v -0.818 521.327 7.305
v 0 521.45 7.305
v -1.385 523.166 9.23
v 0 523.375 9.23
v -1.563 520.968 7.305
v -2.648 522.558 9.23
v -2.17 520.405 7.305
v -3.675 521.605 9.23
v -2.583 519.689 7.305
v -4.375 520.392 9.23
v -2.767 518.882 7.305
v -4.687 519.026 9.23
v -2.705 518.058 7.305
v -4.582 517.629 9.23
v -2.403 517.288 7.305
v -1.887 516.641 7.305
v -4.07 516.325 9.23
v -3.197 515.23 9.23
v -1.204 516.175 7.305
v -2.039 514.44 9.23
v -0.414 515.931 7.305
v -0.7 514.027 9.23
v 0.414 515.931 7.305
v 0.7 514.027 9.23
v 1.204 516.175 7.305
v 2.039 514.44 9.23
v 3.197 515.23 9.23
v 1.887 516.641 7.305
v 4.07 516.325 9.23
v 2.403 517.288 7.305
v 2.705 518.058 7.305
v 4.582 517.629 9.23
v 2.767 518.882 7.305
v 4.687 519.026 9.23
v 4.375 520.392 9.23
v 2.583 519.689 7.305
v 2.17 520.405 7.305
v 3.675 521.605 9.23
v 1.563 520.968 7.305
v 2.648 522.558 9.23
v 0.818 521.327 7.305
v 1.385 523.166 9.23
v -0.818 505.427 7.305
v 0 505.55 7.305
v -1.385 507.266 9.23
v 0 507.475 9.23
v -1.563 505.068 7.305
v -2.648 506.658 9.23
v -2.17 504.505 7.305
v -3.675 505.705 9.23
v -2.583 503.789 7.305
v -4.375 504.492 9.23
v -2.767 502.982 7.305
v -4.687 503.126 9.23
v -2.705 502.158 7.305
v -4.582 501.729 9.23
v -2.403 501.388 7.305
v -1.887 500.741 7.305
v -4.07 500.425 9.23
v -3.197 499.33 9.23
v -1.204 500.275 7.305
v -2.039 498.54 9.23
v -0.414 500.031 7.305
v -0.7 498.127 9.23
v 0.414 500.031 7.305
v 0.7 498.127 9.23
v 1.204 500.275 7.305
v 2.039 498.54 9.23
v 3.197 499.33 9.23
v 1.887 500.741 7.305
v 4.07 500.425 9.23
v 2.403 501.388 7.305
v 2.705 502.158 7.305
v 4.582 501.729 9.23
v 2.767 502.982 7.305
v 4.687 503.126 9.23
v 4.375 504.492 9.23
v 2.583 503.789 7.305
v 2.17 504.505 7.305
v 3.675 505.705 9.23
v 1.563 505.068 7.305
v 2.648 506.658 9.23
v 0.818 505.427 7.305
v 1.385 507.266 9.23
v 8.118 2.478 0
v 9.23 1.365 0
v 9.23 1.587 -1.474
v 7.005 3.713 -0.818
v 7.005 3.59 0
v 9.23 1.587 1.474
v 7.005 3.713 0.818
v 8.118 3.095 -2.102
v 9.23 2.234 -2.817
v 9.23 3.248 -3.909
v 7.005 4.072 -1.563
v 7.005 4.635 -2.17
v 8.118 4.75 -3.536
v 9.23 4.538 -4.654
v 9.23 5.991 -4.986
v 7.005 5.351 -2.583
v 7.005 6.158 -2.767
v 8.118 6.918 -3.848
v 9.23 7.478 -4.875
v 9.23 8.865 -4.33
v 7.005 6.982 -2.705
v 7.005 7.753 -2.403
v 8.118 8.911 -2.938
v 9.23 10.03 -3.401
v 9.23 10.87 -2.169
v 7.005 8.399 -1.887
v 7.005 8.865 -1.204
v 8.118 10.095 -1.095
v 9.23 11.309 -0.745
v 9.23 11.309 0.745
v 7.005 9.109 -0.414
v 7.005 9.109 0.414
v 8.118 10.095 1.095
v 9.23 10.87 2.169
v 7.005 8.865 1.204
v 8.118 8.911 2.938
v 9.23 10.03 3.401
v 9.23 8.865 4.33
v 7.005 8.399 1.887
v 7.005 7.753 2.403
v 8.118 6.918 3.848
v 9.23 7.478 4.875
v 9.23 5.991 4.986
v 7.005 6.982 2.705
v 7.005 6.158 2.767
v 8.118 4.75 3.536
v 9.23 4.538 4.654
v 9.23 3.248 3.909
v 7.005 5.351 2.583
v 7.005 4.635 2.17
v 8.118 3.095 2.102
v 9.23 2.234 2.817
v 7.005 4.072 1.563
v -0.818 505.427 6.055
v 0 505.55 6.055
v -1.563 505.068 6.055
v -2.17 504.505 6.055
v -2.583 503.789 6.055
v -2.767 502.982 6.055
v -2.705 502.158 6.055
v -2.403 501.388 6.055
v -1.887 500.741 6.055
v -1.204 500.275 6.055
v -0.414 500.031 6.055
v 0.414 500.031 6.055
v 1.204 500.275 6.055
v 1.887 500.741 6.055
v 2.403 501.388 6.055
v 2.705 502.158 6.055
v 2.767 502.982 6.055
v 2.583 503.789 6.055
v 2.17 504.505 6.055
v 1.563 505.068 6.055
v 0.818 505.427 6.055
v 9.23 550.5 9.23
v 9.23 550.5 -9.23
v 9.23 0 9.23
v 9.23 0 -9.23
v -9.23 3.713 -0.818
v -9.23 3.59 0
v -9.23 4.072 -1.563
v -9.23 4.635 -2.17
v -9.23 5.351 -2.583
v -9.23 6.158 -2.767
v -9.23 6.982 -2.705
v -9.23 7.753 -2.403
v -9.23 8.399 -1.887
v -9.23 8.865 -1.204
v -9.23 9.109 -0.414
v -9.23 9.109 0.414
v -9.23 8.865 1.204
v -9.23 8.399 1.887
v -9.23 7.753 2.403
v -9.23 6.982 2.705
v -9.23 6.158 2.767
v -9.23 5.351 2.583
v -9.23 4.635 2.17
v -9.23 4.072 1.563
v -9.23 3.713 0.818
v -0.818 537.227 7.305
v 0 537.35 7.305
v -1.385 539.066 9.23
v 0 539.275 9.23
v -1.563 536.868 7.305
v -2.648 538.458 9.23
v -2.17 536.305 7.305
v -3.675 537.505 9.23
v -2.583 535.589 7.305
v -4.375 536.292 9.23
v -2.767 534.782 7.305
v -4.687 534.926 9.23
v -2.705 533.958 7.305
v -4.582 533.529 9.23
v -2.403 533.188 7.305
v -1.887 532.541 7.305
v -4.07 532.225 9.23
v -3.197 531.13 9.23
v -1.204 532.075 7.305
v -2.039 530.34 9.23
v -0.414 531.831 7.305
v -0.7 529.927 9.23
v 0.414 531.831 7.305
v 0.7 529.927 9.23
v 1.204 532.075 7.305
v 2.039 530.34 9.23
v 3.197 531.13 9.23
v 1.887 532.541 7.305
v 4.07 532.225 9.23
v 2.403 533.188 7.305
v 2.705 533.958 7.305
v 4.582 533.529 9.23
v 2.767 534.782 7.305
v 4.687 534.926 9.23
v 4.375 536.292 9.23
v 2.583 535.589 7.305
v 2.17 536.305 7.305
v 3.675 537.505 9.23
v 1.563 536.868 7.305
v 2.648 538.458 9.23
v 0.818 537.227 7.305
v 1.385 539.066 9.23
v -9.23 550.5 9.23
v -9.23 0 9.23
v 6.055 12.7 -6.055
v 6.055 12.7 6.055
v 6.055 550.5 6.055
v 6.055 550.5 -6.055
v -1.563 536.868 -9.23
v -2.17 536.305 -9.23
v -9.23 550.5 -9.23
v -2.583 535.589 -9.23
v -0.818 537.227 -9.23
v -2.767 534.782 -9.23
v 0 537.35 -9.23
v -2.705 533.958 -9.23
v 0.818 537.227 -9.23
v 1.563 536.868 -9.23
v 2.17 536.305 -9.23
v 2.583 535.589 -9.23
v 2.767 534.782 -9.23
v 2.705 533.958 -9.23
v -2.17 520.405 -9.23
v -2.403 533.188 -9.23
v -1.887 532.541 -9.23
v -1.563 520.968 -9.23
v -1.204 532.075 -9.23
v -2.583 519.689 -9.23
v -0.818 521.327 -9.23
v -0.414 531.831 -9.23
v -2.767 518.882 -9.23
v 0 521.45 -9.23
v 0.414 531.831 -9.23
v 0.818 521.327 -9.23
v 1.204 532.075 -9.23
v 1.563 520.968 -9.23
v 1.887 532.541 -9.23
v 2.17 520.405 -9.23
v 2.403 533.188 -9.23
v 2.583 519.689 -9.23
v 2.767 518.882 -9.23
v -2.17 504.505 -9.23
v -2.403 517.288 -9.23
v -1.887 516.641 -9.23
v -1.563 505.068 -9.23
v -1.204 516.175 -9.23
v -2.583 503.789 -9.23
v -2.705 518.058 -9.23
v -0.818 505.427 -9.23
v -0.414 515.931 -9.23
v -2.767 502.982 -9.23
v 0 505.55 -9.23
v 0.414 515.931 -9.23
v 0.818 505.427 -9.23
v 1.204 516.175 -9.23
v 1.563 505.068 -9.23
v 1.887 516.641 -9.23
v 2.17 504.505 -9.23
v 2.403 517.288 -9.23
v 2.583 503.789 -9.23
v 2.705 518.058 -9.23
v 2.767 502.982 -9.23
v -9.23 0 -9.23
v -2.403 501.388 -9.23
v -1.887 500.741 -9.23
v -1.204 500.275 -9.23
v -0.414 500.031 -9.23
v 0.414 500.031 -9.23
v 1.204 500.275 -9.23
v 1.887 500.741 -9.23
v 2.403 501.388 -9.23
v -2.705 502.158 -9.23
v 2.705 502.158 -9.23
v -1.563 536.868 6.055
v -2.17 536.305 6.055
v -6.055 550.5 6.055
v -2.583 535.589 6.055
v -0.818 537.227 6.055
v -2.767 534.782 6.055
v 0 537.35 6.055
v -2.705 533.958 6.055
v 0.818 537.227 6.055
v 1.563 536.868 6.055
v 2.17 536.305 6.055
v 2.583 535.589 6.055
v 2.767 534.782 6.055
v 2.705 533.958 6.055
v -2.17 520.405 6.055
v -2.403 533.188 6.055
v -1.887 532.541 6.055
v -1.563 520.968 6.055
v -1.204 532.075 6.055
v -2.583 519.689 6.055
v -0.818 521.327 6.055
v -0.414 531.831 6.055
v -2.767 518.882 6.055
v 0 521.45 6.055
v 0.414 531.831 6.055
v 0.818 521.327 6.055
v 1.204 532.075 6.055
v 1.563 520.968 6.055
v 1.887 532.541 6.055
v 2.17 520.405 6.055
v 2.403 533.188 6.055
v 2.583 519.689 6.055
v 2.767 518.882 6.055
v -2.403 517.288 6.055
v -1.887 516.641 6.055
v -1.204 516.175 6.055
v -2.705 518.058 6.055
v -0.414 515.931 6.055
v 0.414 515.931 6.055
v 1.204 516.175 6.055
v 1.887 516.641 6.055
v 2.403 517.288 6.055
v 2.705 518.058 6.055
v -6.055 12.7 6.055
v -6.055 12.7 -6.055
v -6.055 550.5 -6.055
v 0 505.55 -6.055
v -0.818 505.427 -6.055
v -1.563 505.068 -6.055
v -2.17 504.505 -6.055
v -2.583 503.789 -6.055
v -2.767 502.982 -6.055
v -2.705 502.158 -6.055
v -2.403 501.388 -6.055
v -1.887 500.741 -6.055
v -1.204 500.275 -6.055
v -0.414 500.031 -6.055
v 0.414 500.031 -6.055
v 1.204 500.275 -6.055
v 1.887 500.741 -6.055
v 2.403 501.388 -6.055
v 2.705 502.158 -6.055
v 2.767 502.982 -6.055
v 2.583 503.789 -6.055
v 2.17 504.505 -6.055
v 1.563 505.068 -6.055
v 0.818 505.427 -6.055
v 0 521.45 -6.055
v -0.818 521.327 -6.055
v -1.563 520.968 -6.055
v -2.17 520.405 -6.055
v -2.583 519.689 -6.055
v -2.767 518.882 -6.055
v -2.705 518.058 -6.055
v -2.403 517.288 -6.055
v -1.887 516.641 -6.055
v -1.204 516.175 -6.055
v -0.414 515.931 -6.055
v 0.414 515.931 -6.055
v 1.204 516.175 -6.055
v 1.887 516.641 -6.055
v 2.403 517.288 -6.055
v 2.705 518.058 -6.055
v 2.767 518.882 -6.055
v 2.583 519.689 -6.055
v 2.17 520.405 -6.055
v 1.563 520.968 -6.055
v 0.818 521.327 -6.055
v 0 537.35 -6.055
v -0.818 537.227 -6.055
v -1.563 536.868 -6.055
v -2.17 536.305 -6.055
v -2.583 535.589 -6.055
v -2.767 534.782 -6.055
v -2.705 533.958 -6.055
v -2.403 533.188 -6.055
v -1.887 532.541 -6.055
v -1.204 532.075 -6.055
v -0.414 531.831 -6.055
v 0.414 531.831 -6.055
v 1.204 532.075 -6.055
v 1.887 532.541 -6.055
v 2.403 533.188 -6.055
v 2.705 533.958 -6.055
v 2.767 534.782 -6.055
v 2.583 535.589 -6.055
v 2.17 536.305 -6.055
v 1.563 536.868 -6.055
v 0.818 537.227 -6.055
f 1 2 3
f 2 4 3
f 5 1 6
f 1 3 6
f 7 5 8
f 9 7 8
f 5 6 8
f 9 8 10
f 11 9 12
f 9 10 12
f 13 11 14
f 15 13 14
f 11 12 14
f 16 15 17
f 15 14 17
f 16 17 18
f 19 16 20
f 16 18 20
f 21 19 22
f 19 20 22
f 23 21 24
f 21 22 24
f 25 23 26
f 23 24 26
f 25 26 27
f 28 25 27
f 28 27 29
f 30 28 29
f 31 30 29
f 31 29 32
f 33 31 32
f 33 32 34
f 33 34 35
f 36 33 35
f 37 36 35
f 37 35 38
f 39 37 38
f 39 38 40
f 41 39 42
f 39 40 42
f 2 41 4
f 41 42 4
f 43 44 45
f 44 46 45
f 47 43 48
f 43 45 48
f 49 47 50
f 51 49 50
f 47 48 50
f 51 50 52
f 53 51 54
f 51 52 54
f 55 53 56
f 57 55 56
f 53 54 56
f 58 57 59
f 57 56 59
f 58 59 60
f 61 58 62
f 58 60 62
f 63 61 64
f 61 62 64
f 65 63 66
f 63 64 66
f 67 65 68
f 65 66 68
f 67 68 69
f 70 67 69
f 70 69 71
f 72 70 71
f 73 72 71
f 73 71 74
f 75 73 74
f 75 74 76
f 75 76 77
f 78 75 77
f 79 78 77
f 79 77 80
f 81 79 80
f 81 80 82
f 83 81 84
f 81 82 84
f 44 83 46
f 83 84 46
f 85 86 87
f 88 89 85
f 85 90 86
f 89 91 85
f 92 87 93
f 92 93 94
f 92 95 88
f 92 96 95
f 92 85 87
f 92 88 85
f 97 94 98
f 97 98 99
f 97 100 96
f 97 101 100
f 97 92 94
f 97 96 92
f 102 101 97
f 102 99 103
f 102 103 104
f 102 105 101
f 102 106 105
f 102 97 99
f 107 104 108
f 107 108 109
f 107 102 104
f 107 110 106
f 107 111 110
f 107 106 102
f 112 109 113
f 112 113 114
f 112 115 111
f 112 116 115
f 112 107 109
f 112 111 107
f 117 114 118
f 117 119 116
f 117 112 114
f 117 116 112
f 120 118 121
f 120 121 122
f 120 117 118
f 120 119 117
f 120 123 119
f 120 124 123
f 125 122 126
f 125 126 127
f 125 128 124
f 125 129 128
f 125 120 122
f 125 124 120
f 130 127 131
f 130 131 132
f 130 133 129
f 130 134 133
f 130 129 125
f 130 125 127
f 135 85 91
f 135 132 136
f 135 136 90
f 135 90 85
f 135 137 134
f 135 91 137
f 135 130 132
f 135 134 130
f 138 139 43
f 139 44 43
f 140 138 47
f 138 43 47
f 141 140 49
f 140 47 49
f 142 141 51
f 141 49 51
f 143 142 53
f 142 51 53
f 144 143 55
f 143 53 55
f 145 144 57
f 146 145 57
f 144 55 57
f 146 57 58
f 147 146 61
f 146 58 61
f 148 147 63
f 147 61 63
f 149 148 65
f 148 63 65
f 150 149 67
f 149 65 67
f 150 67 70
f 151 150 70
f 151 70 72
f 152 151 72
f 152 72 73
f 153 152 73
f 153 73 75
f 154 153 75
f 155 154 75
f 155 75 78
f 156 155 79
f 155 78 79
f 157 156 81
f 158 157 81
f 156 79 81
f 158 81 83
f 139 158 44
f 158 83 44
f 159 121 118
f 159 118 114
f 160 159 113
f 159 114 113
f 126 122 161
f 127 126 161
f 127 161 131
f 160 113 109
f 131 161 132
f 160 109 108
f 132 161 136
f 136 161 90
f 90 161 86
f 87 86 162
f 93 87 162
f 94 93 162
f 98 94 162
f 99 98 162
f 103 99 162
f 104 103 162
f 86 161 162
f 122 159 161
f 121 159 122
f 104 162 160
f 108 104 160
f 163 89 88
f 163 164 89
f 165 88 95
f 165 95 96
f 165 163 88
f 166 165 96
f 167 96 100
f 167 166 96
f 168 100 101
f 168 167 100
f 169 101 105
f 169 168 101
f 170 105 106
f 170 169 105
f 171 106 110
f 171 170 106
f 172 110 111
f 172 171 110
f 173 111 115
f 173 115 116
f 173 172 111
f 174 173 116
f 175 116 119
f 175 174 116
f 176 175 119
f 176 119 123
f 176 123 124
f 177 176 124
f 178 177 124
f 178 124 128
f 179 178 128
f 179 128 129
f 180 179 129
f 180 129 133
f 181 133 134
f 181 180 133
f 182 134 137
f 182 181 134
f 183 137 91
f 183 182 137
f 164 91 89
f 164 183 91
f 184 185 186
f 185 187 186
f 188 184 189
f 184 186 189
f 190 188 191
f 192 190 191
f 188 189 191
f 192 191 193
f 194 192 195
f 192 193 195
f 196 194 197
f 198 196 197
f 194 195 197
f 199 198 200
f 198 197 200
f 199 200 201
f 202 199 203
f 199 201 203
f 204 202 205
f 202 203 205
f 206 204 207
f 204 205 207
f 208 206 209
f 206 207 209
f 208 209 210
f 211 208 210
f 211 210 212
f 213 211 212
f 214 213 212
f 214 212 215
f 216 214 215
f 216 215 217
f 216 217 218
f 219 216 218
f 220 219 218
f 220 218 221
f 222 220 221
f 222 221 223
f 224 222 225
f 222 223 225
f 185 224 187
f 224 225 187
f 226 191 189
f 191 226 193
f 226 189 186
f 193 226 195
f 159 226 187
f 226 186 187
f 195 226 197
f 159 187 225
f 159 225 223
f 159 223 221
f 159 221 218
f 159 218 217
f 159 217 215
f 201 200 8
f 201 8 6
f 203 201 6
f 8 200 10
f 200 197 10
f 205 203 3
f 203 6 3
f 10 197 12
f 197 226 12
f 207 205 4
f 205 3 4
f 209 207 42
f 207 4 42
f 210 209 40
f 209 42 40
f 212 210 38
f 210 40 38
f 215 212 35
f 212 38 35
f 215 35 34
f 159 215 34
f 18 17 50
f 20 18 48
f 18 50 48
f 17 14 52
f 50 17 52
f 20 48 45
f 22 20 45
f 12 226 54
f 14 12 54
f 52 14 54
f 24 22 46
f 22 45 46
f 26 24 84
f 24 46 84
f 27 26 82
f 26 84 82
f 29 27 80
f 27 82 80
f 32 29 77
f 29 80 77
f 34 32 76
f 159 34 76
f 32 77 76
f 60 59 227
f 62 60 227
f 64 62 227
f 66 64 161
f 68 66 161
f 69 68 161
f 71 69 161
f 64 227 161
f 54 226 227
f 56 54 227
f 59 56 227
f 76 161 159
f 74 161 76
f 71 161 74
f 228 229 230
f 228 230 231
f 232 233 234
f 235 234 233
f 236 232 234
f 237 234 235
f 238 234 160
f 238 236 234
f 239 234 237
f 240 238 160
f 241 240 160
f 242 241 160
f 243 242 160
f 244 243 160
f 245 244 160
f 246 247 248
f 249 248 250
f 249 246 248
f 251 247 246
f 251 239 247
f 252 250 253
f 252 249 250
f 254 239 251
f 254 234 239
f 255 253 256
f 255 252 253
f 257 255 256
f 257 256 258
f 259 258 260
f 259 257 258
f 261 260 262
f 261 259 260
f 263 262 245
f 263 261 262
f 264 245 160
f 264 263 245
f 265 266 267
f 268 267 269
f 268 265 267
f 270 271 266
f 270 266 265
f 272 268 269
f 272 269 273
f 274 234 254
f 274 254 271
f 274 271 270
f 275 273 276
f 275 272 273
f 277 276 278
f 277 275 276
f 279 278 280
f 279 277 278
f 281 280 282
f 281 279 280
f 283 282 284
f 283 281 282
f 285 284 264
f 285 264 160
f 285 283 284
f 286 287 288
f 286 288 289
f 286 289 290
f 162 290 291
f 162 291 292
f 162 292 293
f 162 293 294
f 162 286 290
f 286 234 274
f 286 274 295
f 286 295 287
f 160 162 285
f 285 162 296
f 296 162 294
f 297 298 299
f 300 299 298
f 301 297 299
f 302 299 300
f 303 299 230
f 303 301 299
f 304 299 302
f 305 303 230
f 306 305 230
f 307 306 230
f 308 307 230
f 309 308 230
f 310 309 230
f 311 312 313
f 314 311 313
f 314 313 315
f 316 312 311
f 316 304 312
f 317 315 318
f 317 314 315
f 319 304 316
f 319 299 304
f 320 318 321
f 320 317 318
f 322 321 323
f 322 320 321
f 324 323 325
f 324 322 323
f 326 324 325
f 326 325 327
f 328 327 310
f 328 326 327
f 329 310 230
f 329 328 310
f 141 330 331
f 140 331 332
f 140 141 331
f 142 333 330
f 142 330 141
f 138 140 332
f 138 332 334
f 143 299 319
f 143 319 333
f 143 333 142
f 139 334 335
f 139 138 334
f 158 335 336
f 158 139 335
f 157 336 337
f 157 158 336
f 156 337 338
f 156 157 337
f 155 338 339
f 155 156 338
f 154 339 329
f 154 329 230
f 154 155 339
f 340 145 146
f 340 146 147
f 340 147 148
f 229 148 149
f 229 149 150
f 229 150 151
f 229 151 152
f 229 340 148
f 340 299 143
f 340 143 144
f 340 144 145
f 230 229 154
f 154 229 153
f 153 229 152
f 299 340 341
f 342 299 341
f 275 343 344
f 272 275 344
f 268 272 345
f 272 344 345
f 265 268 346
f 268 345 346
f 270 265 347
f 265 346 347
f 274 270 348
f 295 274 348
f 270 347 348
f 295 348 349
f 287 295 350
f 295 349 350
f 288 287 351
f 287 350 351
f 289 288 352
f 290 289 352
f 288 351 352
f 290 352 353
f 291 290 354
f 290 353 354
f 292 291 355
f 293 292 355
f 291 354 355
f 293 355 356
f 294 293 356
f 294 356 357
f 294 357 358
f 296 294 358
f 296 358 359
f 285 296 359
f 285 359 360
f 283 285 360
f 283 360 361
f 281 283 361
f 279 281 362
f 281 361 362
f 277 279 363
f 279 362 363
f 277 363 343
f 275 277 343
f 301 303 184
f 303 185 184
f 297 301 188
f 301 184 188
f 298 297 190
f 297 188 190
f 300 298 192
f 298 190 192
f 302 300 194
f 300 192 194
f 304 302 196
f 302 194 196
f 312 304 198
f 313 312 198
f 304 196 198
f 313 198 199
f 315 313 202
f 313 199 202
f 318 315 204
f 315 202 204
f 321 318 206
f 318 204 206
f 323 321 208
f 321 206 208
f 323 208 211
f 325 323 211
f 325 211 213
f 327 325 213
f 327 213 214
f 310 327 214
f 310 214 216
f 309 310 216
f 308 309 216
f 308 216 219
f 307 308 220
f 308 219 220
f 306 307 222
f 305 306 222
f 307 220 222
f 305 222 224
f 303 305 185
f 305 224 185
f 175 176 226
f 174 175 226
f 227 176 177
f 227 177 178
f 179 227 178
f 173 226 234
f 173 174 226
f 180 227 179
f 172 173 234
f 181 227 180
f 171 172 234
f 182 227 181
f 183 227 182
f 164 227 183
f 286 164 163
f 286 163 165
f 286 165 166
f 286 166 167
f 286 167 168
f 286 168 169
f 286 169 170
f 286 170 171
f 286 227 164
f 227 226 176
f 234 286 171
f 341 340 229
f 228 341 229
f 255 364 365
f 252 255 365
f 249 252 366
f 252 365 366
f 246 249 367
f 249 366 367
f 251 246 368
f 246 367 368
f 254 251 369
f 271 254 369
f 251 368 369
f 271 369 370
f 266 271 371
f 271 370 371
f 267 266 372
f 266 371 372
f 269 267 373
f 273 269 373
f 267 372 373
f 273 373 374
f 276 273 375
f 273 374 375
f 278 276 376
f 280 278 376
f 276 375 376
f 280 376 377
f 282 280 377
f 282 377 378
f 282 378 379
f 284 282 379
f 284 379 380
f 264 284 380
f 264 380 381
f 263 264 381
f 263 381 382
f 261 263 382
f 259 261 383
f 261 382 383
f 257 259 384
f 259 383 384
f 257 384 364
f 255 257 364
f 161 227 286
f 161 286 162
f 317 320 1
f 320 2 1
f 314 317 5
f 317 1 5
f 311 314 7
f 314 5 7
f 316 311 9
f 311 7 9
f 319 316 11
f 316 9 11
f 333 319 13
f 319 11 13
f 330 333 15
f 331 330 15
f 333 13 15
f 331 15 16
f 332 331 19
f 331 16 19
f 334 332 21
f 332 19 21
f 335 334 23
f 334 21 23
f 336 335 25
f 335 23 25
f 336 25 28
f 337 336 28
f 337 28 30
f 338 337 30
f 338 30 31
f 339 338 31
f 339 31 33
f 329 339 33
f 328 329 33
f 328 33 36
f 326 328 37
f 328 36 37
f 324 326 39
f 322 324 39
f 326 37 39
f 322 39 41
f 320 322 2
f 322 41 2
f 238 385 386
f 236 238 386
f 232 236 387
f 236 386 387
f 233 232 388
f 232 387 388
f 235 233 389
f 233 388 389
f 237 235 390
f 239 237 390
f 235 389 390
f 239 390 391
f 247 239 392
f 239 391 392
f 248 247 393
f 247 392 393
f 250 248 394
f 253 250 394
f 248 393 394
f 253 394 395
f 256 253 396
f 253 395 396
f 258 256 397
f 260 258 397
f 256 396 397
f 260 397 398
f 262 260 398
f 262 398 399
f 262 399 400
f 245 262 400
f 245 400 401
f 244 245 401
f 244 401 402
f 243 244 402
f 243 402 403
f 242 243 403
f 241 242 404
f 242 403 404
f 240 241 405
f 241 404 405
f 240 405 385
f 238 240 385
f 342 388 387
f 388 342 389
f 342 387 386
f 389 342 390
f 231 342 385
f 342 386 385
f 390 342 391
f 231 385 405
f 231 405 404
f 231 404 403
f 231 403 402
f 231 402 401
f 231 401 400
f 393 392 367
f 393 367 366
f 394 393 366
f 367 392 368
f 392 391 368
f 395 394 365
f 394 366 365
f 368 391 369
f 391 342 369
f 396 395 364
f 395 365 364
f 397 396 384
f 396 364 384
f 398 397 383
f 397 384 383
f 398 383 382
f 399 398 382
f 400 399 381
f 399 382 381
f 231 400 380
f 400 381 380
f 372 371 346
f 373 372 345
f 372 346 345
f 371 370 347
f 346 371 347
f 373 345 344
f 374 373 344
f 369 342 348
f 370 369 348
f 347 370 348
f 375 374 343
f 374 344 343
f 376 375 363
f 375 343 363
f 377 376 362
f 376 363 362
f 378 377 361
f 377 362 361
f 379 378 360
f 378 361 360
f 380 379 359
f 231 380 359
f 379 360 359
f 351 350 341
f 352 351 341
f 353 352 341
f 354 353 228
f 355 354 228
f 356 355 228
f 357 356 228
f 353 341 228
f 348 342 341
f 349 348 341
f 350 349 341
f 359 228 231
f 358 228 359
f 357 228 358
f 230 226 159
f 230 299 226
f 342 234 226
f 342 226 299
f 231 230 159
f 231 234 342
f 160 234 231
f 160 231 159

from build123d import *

# Parameters (mm, degrees)
SKETCH1_W           = 18.46
SKETCH1_H           = 18.46
SKETCH1_W_2         = 12.11
SKETCH1_H_2         = 12.11
BOSS_EXTRUDE1_DEPTH = 550.5
SKETCH2_W           = 12.11
SKETCH2_H           = 12.11
BOSS_EXTRUDE2_DEPTH = 12.7
LPATTERN1_COUNT     = 3
LPATTERN1_PITCH     = 15.9


with BuildPart() as part:
    # Sketch1 → Boss-Extrude1 (new body)
    with BuildSketch(Plane(origin=(0, 0, 0), x_dir=(1, 0, 0), z_dir=(0, 1, 0))):
        Rectangle(SKETCH1_W, SKETCH1_H)
        Rectangle(SKETCH1_W_2, SKETCH1_H_2, mode=Mode.SUBTRACT)
    extrude(amount=BOSS_EXTRUDE1_DEPTH)

    # Sketch2 → Boss-Extrude2 (add)
    with BuildSketch(Plane.XZ):
        Rectangle(SKETCH2_W, SKETCH2_H)
    extrude(amount=-BOSS_EXTRUDE2_DEPTH)

    # Sketch4 → Cut-Revolve1 (revolve, cut)
    with BuildSketch(Plane.XY):
        Polygon((-9.23, 6.365), (9.23, 6.365), (9.23, 1.365), (7.005, 3.59), (-9.23, 3.59), align=None)
    revolve(axis=Axis((-9.23, 6.365, 0), (1, 0, 0)), mode=Mode.SUBTRACT)

    # Sketch5 → Cut-Revolve2 (revolve, cut)
    with BuildSketch(Plane(origin=(0, 0, 0), x_dir=(0, 0, -1), z_dir=(1, 0, 0))):
        Polygon((-7.305, 537.35), (-9.23, 539.275), (-9.23, 534.575), (9.23, 534.575), (9.23, 537.35), align=None)
    cut_revolve2 = revolve(axis=Axis((0, 534.575, 9.23), (0, 0, 1)), mode=Mode.SUBTRACT)

    # LPattern1: Cut-Revolve2 ×3
    with Locations(*[(0, -i * LPATTERN1_PITCH, 0) for i in range(1, LPATTERN1_COUNT)]):
        add(cut_revolve2, mode=Mode.SUBTRACT)


solid = part.part
